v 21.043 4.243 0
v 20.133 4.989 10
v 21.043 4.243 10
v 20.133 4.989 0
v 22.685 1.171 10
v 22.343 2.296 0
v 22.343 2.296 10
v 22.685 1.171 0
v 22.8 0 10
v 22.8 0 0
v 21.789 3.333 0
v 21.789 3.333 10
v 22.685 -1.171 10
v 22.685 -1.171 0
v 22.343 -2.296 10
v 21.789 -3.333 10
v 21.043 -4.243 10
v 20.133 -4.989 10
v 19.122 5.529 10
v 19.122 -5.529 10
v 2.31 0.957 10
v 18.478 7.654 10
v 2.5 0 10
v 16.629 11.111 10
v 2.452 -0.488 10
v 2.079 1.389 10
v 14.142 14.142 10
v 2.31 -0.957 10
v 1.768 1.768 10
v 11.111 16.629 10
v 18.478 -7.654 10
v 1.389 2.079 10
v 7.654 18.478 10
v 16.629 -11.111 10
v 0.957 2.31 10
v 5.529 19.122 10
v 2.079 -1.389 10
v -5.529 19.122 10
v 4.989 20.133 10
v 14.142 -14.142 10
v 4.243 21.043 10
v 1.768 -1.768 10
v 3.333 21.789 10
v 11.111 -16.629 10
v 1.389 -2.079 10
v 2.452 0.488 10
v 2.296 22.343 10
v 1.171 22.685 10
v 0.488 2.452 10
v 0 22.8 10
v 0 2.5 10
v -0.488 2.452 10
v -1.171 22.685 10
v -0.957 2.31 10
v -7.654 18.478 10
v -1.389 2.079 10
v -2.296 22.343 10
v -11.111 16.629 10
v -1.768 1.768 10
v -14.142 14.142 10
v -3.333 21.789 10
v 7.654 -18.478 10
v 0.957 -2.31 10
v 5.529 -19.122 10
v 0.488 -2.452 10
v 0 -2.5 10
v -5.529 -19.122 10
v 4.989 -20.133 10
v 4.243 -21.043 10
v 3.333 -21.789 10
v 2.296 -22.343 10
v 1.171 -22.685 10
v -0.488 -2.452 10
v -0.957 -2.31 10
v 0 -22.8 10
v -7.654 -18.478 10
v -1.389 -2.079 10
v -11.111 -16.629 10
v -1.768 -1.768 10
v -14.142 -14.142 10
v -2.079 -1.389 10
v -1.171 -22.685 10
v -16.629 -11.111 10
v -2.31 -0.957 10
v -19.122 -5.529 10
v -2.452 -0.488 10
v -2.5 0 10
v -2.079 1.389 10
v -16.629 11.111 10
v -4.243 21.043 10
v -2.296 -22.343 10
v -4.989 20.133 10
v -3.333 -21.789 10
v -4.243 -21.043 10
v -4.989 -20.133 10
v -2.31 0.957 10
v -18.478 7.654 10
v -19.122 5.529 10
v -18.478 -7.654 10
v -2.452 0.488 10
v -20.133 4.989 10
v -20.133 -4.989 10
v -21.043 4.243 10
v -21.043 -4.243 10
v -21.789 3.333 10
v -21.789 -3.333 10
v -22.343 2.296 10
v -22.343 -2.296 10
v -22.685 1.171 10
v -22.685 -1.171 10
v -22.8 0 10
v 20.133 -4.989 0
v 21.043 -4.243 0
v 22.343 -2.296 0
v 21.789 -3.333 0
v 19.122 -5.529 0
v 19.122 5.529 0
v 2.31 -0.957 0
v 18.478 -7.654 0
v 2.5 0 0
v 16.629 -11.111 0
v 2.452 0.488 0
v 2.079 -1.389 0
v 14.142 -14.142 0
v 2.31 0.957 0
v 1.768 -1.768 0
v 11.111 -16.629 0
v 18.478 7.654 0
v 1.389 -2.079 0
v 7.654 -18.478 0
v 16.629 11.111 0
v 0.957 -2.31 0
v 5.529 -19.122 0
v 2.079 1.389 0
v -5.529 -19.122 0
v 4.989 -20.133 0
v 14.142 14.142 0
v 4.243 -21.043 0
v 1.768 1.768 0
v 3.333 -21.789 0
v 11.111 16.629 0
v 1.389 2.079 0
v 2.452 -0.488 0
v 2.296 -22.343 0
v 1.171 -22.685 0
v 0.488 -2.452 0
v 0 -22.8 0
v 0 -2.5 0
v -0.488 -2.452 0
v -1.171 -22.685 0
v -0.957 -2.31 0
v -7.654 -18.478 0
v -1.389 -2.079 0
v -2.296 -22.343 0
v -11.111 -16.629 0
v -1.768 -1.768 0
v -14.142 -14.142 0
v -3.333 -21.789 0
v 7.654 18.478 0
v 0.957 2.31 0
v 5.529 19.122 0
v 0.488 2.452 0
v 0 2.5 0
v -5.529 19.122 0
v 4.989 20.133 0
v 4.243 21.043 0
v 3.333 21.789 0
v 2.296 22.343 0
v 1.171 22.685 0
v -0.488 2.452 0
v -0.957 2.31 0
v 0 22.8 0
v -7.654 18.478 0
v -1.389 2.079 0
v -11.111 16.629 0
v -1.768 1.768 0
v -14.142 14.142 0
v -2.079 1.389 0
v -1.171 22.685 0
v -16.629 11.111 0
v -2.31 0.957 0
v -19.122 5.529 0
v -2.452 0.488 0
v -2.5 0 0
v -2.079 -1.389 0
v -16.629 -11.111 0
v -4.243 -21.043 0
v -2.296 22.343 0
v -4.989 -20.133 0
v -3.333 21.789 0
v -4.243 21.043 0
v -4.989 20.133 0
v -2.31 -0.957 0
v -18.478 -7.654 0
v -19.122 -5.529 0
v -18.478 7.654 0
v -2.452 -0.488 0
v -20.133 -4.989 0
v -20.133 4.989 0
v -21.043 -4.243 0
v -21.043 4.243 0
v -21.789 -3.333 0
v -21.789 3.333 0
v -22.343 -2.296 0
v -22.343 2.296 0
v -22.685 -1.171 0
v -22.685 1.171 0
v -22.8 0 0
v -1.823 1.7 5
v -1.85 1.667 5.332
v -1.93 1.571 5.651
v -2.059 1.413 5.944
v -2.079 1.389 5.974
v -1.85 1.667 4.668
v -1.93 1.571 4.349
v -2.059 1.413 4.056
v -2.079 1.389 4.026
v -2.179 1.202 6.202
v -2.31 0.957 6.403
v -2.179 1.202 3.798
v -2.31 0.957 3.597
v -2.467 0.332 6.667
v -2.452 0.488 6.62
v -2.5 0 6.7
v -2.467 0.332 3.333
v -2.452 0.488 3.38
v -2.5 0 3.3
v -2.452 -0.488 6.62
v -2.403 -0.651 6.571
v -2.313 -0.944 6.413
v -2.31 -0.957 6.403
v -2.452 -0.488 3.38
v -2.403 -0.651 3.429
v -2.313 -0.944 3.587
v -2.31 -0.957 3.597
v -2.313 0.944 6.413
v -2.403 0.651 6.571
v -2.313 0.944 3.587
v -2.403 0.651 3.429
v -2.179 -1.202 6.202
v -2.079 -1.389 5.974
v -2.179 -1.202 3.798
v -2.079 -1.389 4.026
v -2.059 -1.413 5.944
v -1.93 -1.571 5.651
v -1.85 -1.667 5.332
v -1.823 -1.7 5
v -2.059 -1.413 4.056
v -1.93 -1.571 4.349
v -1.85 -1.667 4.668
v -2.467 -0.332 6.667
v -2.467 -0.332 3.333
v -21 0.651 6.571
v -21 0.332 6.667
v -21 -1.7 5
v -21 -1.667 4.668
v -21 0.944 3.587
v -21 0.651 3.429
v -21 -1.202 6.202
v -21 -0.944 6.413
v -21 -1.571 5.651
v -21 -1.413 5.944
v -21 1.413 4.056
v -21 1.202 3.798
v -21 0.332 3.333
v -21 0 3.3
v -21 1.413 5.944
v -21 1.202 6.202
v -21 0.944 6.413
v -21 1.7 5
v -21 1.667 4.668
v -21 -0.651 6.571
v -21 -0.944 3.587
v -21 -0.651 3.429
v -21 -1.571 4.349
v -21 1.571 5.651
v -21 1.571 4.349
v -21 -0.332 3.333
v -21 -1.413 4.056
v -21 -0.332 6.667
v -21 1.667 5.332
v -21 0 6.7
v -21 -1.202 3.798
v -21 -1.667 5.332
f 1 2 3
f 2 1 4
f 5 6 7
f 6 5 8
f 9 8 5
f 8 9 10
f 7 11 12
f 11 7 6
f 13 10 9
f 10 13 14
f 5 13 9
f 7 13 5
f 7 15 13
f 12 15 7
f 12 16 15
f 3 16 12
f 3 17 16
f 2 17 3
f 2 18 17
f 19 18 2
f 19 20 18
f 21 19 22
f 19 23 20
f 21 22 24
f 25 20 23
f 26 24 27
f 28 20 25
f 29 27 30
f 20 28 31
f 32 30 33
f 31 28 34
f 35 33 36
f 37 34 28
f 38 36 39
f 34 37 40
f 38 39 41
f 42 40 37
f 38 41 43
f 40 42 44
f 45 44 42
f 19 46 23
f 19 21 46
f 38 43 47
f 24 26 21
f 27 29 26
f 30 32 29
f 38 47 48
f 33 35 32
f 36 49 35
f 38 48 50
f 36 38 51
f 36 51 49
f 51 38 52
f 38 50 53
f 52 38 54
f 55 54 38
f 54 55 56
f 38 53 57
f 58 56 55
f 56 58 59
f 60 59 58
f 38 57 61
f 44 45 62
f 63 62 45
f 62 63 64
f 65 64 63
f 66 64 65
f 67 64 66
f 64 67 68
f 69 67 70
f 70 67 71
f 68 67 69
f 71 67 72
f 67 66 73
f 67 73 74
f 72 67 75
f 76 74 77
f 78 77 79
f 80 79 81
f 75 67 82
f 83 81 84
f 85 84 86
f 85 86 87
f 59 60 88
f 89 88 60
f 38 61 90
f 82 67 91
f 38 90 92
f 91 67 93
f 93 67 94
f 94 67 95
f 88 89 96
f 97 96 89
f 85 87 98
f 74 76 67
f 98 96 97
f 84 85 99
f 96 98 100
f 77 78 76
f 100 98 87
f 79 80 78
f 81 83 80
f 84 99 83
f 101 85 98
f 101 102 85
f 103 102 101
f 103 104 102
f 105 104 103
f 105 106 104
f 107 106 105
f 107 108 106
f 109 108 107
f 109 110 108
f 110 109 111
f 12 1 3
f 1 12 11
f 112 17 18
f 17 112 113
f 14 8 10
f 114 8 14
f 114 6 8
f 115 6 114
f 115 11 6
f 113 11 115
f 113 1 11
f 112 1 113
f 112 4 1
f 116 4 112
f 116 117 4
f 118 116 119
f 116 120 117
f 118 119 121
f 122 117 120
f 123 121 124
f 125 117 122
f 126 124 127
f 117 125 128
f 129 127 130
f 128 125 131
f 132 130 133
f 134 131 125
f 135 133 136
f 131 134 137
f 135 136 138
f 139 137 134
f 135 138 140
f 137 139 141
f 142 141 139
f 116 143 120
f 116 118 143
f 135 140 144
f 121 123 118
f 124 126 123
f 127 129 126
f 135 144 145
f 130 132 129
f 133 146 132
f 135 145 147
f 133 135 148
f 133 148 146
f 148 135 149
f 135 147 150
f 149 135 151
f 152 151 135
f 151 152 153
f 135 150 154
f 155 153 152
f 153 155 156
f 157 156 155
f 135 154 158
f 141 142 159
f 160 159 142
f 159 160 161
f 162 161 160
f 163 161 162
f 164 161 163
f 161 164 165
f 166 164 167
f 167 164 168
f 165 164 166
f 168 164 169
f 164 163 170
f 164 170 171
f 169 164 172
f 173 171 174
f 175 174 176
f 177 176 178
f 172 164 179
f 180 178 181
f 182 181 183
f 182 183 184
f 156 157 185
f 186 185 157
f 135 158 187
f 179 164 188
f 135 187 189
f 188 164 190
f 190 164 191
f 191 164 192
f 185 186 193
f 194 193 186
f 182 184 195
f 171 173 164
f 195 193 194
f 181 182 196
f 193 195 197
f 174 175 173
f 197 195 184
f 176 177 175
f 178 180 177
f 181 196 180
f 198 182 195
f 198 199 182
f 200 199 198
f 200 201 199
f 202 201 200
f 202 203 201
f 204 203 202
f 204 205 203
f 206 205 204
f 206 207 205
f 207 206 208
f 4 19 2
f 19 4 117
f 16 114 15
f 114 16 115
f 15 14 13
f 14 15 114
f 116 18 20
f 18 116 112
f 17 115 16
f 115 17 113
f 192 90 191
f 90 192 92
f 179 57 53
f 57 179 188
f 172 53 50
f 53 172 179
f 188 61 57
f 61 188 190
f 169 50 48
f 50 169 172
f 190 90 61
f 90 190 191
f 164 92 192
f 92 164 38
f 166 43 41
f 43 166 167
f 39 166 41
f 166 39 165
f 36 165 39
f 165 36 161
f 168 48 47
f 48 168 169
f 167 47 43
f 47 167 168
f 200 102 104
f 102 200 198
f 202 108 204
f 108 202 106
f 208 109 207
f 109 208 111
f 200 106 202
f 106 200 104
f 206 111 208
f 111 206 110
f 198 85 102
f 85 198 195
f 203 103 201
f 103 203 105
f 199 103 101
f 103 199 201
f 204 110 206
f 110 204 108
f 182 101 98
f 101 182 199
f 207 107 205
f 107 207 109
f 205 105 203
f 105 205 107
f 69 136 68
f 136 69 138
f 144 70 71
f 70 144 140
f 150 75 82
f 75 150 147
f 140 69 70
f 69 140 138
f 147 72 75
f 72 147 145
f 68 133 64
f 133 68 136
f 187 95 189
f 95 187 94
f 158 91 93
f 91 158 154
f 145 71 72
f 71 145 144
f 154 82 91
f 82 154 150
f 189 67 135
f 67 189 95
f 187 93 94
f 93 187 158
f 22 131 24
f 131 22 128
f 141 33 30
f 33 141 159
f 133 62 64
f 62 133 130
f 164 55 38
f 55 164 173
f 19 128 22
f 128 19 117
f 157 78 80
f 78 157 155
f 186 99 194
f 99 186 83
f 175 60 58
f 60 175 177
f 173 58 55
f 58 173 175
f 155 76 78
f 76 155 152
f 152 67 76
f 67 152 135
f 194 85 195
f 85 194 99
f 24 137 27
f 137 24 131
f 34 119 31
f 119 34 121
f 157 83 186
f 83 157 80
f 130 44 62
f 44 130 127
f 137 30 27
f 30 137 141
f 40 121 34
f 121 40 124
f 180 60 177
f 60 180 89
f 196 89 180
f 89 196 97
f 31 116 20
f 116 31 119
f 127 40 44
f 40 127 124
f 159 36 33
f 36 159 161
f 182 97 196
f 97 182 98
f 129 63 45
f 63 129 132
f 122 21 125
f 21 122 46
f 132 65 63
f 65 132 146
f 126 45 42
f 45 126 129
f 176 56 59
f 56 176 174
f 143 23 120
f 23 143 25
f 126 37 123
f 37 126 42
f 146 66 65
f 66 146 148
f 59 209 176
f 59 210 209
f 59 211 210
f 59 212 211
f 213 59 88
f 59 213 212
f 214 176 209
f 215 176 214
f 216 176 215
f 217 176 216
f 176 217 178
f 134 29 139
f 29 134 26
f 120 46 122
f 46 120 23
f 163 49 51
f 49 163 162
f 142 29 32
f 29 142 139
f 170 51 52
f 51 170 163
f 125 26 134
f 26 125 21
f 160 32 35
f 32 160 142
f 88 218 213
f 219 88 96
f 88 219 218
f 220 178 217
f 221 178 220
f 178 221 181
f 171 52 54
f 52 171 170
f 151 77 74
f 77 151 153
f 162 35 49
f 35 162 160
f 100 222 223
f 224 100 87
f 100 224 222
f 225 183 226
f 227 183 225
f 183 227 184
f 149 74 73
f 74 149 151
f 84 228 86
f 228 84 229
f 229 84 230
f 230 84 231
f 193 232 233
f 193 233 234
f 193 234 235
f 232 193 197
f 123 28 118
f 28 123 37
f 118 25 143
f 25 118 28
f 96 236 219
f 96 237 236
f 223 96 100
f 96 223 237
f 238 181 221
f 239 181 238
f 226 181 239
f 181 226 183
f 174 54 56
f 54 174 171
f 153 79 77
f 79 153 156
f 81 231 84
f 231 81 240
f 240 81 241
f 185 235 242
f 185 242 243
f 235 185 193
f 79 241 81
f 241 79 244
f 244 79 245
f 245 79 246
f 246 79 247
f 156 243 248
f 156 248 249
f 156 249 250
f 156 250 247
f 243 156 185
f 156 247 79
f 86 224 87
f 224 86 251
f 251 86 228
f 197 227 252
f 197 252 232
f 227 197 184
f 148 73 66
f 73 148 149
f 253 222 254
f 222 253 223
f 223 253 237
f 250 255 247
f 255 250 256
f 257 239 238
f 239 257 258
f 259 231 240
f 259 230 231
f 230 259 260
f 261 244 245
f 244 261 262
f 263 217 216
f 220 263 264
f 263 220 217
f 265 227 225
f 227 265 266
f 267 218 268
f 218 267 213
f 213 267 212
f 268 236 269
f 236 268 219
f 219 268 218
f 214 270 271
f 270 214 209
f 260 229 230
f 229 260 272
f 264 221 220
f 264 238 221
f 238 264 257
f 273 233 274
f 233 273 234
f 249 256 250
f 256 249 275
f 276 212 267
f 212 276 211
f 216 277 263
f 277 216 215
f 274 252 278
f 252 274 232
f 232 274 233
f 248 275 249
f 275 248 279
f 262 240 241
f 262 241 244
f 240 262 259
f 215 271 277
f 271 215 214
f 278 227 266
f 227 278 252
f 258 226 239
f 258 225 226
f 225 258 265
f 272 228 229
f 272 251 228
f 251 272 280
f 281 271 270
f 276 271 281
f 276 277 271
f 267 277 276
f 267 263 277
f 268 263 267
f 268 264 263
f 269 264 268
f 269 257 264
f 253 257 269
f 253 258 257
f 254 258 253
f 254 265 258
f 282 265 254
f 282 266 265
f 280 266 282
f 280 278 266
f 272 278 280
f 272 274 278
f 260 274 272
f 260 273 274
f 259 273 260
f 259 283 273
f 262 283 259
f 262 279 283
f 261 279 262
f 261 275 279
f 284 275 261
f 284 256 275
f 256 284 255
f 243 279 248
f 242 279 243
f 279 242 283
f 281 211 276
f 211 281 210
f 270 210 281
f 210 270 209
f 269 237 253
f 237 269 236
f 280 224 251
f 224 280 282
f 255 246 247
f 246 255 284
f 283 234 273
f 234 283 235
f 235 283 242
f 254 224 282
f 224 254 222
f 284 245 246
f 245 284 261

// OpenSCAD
$fn = 32;

// ----------------------------------------------------------------------
// Hand knob: 40 x 40 x 10 mm
// ----------------------------------------------------------------------

// --- parameters (mm) ---
grip_d = 40;              // knob diameter
grip_h = 10;              // knob height
shaft_d = 5;              // shaft bore
set_d = 3.4;              // set screw tap hole
knurl_dia = 0.92;         // knurl groove diameter
lobes = 4;                // grip lobes

module body() {
  cylinder(h = grip_h, d = grip_d);
  for (i = [0 : lobes - 1])
    rotate([0, 0, i * 360 / lobes])
      translate([grip_d * 0.42, 0, 0])
        cylinder(h = grip_h, d = grip_d * 0.3);
}

difference() {
  union() {
    body();
  }
  translate([0, 0, -1]) cylinder(h = grip_h + 0 + 2, d = shaft_d);
  translate([-grip_d / 2 - 1, 0, grip_h * 0.5]) rotate([0, 90, 0]) cylinder(h = grip_d / 2 + 2, d = set_d);
}
